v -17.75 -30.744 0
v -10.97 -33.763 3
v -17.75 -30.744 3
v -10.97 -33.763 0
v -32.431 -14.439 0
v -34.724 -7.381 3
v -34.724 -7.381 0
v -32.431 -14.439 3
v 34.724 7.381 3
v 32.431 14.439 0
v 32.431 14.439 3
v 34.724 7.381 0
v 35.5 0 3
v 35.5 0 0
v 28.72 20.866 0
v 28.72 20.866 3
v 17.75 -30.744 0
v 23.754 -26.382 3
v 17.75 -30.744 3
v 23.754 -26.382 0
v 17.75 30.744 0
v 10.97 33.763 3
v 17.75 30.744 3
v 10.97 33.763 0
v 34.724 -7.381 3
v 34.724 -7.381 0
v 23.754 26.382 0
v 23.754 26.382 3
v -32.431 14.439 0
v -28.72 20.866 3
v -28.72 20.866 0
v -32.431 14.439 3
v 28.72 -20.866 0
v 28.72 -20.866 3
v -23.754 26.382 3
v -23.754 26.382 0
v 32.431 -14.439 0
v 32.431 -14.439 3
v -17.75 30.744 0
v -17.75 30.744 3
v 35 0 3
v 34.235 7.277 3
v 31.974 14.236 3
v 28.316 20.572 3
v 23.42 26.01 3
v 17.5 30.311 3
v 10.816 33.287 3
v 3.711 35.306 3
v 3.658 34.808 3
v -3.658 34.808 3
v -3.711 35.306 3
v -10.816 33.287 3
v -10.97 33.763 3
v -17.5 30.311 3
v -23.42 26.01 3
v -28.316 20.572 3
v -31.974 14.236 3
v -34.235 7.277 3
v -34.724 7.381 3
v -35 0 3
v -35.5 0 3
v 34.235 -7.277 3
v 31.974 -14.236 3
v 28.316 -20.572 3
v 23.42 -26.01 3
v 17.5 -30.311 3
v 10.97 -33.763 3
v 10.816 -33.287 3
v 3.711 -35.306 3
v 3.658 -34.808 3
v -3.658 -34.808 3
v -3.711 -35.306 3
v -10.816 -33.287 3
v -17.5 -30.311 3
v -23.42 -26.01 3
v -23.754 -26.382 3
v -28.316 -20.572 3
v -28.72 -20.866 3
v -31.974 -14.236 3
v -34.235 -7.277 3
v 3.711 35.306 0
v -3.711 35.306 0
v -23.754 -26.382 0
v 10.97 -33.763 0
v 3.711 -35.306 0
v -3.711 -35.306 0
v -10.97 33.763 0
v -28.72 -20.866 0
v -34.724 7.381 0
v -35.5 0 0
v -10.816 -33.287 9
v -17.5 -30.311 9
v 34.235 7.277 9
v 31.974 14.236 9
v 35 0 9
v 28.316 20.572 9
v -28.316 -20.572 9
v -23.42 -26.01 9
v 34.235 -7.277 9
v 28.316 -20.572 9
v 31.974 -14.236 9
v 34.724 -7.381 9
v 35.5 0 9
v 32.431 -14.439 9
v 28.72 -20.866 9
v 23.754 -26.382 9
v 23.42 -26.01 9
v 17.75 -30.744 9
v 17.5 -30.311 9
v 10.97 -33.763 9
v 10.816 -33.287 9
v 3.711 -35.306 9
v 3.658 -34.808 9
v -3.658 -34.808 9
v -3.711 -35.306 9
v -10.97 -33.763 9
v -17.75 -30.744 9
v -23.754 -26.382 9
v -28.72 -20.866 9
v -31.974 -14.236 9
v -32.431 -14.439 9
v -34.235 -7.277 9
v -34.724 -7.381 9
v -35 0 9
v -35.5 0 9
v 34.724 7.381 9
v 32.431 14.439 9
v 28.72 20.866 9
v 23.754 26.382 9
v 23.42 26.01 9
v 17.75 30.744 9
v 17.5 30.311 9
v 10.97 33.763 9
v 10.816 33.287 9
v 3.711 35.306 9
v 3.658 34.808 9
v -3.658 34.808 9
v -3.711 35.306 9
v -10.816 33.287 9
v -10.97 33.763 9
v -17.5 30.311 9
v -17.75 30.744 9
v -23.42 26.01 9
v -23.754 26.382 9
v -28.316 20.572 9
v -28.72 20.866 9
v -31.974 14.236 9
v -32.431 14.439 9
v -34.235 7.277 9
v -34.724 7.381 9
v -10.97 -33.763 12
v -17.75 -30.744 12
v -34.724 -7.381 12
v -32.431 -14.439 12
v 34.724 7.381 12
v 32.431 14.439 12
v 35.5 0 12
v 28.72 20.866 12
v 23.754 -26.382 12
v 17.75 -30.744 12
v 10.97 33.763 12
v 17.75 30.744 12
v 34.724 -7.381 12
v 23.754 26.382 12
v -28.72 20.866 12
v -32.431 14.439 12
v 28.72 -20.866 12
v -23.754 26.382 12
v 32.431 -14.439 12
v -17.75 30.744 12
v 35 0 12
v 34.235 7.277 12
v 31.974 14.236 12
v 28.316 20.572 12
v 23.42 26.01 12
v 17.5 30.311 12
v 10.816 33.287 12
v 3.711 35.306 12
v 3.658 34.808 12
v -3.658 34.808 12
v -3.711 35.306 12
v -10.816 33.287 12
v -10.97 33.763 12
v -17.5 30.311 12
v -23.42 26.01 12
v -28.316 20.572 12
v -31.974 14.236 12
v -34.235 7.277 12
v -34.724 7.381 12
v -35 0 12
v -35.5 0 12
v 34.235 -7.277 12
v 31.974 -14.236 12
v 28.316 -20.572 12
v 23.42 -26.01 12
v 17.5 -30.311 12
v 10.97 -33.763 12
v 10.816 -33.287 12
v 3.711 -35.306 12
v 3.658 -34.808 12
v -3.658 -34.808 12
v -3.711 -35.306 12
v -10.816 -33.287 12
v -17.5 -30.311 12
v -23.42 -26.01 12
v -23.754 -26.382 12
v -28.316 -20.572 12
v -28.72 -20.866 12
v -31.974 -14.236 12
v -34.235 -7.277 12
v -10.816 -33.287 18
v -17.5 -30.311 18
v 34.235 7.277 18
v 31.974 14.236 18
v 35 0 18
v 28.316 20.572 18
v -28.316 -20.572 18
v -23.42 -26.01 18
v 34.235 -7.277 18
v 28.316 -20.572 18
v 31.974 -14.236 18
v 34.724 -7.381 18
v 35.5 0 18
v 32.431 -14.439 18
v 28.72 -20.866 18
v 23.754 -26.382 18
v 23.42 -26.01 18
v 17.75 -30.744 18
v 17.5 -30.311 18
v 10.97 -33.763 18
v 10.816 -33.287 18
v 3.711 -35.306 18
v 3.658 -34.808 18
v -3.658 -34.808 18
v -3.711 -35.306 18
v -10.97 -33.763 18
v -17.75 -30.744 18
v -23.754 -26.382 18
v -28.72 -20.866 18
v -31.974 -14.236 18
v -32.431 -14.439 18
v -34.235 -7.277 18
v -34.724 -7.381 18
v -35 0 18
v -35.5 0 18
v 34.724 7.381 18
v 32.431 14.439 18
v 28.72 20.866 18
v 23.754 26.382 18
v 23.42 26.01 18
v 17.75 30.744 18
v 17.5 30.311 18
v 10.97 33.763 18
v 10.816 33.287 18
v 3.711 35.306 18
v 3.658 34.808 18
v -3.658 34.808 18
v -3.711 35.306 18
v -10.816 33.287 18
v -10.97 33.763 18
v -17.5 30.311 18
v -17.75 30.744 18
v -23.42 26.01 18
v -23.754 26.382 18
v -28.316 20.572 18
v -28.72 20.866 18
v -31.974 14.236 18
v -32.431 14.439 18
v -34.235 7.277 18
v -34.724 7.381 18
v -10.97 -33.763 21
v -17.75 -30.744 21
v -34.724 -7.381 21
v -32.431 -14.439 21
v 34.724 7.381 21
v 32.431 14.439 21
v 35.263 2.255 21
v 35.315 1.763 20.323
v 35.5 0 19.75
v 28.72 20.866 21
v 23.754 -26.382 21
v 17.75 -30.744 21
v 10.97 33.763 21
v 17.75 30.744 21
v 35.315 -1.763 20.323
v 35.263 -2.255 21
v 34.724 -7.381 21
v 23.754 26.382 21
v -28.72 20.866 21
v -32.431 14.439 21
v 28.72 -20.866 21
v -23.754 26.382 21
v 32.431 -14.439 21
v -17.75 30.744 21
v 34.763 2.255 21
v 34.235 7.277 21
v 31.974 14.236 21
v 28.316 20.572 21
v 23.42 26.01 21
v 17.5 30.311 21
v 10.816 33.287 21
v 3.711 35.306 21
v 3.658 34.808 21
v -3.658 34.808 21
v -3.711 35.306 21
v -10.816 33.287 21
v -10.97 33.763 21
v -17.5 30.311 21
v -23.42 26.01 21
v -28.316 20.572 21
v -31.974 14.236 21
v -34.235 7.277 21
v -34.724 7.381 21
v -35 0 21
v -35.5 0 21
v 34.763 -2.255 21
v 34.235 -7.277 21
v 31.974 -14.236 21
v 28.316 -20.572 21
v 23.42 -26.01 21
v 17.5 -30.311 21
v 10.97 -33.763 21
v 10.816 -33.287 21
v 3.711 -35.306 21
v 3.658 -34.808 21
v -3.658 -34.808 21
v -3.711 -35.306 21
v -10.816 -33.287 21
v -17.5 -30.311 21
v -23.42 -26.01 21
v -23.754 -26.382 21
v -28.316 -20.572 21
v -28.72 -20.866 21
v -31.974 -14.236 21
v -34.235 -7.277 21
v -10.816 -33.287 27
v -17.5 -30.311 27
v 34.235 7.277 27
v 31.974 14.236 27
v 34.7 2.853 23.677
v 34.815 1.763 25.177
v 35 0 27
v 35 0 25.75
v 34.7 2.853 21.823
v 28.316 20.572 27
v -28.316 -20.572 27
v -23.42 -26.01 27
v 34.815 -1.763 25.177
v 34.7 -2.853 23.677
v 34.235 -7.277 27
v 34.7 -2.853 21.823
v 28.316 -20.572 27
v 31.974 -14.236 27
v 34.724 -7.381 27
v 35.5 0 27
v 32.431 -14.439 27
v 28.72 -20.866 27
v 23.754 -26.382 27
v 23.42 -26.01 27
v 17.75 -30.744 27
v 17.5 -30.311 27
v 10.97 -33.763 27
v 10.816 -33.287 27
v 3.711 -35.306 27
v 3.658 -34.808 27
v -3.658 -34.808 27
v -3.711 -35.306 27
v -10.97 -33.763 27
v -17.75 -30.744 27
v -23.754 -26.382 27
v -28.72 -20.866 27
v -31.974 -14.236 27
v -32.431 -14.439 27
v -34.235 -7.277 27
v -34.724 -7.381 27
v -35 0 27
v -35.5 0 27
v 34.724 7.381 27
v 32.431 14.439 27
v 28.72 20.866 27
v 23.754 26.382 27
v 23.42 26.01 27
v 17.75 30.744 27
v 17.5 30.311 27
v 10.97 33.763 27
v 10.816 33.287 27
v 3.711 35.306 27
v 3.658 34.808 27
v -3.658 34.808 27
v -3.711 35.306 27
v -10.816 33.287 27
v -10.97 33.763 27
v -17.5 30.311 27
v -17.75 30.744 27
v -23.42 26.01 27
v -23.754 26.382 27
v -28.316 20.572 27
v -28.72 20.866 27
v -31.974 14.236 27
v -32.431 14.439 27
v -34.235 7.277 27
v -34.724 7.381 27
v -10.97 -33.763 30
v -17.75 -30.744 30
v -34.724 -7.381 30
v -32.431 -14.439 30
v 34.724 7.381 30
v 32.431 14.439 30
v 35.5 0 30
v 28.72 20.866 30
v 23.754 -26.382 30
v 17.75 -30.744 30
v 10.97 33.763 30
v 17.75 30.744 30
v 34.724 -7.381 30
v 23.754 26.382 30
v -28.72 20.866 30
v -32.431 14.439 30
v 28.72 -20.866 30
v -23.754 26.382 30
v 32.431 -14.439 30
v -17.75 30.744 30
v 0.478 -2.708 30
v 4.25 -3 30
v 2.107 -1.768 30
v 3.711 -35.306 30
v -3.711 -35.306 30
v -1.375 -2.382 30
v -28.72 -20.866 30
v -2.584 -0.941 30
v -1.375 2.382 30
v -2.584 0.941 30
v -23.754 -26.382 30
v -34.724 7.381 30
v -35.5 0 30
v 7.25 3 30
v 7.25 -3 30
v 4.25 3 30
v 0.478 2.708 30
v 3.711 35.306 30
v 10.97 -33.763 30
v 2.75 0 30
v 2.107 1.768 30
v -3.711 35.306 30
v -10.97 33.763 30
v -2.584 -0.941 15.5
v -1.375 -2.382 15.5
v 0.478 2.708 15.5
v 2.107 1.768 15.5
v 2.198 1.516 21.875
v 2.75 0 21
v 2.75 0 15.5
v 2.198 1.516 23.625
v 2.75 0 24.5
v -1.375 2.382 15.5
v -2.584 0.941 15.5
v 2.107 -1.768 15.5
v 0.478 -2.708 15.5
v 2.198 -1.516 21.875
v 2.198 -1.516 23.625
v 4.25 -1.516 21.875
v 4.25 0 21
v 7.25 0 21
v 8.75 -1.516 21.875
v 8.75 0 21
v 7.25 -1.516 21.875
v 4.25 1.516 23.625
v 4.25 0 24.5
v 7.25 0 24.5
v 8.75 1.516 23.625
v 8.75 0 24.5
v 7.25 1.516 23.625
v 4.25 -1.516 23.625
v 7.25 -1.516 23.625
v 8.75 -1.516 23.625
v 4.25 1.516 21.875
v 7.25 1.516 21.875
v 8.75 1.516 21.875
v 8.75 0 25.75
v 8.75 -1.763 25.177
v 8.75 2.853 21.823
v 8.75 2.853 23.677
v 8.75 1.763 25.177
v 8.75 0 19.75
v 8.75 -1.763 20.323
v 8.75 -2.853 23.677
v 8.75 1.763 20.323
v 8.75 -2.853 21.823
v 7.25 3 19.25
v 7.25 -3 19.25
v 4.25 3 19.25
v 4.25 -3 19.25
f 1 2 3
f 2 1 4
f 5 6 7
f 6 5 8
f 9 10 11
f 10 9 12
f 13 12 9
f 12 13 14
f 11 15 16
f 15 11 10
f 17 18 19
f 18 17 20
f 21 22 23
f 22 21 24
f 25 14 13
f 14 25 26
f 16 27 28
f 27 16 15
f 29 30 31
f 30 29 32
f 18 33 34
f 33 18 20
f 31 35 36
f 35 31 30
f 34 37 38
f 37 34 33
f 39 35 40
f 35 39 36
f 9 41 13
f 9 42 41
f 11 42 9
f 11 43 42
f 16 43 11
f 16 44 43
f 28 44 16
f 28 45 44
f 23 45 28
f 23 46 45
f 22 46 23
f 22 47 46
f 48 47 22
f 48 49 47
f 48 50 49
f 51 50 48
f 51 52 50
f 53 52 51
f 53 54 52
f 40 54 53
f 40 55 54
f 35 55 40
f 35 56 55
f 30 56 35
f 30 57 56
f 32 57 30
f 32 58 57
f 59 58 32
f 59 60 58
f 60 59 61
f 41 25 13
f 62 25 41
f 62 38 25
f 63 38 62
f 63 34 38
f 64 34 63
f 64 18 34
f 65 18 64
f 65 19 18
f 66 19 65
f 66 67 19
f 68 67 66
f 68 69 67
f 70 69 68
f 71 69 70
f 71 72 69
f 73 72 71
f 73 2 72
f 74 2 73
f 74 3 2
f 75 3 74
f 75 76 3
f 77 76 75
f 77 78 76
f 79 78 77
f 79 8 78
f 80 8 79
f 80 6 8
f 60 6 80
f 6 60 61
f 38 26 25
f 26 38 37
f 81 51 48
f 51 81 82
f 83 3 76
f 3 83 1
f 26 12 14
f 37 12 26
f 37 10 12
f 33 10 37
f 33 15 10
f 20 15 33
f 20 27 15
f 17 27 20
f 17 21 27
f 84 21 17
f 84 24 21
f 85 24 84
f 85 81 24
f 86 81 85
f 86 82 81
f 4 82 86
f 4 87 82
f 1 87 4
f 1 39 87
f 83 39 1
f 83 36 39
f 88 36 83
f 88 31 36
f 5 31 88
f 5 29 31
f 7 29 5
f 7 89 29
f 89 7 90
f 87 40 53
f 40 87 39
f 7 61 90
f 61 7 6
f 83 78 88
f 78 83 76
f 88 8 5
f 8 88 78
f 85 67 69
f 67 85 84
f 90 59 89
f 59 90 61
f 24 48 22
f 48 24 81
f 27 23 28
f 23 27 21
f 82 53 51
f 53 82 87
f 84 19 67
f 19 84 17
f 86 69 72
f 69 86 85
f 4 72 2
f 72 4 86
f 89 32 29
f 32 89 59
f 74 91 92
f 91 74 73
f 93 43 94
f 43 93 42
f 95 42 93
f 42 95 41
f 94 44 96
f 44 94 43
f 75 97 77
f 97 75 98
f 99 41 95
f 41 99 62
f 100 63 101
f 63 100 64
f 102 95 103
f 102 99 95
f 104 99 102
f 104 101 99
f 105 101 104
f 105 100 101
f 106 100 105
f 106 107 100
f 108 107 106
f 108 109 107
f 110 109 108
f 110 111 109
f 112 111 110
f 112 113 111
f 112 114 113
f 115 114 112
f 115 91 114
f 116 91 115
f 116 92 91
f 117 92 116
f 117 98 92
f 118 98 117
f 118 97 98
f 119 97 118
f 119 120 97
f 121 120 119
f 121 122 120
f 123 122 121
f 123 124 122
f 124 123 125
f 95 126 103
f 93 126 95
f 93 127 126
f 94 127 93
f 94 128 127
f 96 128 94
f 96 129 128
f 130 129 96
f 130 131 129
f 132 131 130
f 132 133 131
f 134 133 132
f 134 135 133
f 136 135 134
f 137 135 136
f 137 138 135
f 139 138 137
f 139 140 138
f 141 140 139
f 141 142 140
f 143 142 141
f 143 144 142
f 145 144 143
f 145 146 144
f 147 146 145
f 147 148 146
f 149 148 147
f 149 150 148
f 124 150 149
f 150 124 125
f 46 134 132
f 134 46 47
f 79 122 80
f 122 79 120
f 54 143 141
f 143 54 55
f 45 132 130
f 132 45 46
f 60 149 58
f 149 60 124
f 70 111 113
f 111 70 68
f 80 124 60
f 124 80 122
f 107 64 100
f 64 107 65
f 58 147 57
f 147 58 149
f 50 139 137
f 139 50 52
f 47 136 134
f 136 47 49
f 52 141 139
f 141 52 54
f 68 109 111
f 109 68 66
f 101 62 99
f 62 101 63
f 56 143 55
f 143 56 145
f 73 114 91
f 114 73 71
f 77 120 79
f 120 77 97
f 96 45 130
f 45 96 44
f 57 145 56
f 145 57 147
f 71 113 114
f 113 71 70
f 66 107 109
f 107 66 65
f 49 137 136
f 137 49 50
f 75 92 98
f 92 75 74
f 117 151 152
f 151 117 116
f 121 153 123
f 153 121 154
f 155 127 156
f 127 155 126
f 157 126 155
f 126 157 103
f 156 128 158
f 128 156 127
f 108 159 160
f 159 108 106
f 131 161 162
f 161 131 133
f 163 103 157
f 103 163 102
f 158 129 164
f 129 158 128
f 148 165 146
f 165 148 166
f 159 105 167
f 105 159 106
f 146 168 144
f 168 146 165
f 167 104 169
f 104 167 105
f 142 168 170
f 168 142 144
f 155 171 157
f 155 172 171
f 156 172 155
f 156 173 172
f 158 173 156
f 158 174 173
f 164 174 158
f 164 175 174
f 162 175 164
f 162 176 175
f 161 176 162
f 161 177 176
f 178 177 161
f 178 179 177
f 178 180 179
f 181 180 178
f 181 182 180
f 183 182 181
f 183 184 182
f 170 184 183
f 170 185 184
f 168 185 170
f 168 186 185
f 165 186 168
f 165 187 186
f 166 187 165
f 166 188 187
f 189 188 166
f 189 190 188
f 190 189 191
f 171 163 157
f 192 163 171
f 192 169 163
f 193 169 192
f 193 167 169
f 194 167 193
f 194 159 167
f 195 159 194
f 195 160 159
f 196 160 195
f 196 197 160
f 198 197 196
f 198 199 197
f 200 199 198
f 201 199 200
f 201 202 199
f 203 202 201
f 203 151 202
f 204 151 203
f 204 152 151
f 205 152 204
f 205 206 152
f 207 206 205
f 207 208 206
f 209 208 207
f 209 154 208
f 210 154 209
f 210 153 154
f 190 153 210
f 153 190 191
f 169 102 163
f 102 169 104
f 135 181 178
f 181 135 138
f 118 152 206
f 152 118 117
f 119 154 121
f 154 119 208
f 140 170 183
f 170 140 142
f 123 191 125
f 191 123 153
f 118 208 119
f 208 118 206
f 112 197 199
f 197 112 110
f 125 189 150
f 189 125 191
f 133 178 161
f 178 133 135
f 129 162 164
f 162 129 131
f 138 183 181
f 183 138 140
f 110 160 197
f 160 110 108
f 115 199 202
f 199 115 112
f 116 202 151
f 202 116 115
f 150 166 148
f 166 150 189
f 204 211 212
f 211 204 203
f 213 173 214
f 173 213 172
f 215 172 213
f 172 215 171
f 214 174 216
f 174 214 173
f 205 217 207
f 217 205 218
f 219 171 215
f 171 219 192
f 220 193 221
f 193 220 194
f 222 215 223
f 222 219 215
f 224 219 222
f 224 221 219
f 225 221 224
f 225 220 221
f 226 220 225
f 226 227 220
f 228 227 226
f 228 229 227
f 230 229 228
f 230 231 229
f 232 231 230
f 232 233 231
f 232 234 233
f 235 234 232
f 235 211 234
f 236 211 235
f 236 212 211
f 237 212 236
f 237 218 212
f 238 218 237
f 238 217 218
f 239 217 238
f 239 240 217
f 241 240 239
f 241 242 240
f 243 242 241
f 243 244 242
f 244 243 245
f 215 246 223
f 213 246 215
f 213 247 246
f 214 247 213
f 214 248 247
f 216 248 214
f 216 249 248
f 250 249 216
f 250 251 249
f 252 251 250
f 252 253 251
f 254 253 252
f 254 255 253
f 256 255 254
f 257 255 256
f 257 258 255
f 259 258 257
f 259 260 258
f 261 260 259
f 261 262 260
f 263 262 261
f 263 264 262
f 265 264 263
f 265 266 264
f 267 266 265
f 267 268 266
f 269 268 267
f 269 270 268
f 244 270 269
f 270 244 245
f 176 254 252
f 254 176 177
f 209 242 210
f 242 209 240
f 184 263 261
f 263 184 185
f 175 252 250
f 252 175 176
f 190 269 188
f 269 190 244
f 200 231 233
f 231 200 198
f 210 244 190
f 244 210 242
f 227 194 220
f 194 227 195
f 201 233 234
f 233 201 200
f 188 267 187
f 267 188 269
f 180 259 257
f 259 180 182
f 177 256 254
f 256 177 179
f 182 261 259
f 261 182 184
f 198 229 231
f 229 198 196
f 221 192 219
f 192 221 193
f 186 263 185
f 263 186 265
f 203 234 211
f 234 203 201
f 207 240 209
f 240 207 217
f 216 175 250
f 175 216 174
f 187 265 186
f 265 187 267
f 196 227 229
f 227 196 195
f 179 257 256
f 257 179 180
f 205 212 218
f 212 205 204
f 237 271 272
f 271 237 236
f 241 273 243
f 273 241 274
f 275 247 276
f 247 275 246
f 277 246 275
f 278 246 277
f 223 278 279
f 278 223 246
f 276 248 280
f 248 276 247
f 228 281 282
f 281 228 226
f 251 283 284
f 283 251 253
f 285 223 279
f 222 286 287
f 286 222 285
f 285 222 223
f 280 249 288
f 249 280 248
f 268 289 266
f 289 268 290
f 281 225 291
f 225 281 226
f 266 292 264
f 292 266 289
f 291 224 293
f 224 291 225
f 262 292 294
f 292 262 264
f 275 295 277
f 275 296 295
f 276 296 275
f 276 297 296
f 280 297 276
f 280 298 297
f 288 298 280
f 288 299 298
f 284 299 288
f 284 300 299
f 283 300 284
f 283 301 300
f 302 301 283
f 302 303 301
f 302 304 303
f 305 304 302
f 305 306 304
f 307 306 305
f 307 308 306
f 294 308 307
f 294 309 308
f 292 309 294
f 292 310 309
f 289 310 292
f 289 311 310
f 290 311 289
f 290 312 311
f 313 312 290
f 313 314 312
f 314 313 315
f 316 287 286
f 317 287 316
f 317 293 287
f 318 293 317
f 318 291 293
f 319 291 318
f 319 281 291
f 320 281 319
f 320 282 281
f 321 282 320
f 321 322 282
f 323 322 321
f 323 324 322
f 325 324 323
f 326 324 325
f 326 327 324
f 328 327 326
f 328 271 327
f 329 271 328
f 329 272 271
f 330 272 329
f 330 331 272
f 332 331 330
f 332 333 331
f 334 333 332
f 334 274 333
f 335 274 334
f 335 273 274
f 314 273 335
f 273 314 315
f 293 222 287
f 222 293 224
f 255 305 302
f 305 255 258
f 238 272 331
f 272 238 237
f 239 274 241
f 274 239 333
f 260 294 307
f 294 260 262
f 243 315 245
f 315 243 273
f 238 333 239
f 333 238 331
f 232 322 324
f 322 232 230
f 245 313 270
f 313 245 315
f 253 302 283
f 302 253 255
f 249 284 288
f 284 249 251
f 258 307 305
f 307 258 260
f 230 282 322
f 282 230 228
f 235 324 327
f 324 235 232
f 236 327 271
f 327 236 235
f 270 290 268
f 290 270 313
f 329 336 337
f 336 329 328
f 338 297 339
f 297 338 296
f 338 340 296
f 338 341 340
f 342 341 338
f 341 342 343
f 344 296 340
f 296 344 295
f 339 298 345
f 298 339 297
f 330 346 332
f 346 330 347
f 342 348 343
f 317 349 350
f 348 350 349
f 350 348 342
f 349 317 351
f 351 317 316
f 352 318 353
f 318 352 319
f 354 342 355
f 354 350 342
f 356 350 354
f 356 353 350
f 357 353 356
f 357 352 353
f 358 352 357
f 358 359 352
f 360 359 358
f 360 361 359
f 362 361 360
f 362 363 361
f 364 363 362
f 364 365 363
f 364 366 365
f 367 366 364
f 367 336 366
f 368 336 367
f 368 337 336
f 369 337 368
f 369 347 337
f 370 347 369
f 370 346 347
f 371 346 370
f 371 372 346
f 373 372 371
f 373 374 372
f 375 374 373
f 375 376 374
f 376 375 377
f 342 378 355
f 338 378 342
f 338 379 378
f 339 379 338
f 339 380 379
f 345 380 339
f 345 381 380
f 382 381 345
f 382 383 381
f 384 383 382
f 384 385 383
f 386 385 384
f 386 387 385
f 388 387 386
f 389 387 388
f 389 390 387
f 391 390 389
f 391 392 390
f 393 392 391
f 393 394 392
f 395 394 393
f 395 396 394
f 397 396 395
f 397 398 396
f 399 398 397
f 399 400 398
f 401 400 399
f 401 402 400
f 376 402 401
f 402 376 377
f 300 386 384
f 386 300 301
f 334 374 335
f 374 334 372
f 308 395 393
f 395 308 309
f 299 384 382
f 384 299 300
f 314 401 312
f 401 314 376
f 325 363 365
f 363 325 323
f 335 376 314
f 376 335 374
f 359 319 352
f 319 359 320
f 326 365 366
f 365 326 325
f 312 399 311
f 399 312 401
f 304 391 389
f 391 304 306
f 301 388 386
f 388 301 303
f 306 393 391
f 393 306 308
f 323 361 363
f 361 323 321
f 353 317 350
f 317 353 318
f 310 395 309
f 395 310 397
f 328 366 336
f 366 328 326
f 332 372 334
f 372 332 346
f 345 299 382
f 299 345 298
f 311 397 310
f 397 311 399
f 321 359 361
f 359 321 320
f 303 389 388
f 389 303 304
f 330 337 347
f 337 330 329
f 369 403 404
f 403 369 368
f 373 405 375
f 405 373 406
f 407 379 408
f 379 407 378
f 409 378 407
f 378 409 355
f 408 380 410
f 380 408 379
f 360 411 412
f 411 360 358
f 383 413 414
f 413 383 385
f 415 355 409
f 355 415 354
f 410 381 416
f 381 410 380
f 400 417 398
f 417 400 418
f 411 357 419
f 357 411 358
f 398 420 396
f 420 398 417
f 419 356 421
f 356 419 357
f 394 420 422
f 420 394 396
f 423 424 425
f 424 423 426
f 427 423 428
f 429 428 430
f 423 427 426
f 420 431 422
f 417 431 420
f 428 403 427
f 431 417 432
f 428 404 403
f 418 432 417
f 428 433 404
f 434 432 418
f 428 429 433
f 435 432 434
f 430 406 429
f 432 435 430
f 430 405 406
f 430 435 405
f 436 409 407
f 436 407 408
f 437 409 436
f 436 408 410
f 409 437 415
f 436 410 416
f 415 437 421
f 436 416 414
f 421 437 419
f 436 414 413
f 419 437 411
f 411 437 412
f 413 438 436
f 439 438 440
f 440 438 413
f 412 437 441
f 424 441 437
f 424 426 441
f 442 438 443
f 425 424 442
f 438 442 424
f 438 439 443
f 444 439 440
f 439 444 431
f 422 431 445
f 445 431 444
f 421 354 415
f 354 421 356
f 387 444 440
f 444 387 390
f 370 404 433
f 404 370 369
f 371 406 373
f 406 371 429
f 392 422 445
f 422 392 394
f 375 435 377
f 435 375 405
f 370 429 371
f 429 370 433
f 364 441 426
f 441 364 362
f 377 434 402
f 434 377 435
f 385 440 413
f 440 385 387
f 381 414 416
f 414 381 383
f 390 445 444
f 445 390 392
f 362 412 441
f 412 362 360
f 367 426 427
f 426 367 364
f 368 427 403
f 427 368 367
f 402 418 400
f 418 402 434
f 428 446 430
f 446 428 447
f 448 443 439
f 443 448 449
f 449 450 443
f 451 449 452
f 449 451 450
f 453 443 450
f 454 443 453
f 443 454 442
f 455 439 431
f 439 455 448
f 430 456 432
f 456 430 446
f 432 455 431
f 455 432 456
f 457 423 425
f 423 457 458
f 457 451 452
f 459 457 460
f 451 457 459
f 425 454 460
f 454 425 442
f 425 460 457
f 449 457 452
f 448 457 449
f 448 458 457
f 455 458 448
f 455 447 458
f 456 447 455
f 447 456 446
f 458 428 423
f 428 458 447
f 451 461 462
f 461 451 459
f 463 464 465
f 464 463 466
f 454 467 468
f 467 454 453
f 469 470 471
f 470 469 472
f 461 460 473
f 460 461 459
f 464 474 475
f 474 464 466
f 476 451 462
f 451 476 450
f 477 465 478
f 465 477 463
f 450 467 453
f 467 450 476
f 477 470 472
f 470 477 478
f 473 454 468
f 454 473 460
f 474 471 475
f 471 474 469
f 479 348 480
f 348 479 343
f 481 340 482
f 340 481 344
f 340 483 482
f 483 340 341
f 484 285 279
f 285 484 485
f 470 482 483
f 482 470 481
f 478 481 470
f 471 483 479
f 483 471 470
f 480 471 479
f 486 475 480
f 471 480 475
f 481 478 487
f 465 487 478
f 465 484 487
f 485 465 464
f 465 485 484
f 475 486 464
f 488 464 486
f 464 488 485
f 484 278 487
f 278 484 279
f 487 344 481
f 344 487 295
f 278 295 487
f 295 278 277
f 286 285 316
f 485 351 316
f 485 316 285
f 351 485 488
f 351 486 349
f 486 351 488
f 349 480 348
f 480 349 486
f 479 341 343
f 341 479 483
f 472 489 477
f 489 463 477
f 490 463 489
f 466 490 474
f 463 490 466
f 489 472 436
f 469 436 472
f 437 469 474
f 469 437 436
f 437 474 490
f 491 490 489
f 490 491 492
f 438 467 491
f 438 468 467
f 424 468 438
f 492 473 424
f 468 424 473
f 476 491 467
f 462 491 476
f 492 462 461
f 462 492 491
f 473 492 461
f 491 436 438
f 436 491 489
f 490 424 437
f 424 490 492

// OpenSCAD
// Uncomment before final render
//$fa = 0.01;
//$fs = 0.25;

module yAxisWheel()
{
    difference()
    {
        union()
        {
            cylinder(3, 35.5, 35.5);
            translate([0, 0, 3])
            {
                cylinder(6, 35, 35);
            }
            translate([0, 0, 9])
            {
                cylinder(3, 35.5, 35.5);
            }
            translate([0, 0, 12])
            {
                cylinder(6, 35, 35);
            }
            translate([0, 0, 18])
            {
                cylinder(3, 35.5, 35.5);
            }
            translate([0, 0, 21])
            {
                cylinder(6, 35, 35);
            }
            translate([0, 0, 27])
            {
                cylinder(3, 35.5, 35.5);
            }
        }
        translate([0, 0, 15.5])
        {
            cylinder(15.5, 2.75, 2.75);
        }
        translate([0, 0, 22.75])
        {
            rotate([0, 90, 0])
            {
                cylinder(36.5, 1.75, 1.75);
            }
        }
        translate([8.75, 0, 22.75])
        {
            rotate([0, 90, 0])
            {
                cylinder(26.75, 3, 3);
            }
        }
        translate([4.25, -3, 19.25])
        {
            cube([3, 6, 11.75]);
        }
    }
}

yAxisWheel();
